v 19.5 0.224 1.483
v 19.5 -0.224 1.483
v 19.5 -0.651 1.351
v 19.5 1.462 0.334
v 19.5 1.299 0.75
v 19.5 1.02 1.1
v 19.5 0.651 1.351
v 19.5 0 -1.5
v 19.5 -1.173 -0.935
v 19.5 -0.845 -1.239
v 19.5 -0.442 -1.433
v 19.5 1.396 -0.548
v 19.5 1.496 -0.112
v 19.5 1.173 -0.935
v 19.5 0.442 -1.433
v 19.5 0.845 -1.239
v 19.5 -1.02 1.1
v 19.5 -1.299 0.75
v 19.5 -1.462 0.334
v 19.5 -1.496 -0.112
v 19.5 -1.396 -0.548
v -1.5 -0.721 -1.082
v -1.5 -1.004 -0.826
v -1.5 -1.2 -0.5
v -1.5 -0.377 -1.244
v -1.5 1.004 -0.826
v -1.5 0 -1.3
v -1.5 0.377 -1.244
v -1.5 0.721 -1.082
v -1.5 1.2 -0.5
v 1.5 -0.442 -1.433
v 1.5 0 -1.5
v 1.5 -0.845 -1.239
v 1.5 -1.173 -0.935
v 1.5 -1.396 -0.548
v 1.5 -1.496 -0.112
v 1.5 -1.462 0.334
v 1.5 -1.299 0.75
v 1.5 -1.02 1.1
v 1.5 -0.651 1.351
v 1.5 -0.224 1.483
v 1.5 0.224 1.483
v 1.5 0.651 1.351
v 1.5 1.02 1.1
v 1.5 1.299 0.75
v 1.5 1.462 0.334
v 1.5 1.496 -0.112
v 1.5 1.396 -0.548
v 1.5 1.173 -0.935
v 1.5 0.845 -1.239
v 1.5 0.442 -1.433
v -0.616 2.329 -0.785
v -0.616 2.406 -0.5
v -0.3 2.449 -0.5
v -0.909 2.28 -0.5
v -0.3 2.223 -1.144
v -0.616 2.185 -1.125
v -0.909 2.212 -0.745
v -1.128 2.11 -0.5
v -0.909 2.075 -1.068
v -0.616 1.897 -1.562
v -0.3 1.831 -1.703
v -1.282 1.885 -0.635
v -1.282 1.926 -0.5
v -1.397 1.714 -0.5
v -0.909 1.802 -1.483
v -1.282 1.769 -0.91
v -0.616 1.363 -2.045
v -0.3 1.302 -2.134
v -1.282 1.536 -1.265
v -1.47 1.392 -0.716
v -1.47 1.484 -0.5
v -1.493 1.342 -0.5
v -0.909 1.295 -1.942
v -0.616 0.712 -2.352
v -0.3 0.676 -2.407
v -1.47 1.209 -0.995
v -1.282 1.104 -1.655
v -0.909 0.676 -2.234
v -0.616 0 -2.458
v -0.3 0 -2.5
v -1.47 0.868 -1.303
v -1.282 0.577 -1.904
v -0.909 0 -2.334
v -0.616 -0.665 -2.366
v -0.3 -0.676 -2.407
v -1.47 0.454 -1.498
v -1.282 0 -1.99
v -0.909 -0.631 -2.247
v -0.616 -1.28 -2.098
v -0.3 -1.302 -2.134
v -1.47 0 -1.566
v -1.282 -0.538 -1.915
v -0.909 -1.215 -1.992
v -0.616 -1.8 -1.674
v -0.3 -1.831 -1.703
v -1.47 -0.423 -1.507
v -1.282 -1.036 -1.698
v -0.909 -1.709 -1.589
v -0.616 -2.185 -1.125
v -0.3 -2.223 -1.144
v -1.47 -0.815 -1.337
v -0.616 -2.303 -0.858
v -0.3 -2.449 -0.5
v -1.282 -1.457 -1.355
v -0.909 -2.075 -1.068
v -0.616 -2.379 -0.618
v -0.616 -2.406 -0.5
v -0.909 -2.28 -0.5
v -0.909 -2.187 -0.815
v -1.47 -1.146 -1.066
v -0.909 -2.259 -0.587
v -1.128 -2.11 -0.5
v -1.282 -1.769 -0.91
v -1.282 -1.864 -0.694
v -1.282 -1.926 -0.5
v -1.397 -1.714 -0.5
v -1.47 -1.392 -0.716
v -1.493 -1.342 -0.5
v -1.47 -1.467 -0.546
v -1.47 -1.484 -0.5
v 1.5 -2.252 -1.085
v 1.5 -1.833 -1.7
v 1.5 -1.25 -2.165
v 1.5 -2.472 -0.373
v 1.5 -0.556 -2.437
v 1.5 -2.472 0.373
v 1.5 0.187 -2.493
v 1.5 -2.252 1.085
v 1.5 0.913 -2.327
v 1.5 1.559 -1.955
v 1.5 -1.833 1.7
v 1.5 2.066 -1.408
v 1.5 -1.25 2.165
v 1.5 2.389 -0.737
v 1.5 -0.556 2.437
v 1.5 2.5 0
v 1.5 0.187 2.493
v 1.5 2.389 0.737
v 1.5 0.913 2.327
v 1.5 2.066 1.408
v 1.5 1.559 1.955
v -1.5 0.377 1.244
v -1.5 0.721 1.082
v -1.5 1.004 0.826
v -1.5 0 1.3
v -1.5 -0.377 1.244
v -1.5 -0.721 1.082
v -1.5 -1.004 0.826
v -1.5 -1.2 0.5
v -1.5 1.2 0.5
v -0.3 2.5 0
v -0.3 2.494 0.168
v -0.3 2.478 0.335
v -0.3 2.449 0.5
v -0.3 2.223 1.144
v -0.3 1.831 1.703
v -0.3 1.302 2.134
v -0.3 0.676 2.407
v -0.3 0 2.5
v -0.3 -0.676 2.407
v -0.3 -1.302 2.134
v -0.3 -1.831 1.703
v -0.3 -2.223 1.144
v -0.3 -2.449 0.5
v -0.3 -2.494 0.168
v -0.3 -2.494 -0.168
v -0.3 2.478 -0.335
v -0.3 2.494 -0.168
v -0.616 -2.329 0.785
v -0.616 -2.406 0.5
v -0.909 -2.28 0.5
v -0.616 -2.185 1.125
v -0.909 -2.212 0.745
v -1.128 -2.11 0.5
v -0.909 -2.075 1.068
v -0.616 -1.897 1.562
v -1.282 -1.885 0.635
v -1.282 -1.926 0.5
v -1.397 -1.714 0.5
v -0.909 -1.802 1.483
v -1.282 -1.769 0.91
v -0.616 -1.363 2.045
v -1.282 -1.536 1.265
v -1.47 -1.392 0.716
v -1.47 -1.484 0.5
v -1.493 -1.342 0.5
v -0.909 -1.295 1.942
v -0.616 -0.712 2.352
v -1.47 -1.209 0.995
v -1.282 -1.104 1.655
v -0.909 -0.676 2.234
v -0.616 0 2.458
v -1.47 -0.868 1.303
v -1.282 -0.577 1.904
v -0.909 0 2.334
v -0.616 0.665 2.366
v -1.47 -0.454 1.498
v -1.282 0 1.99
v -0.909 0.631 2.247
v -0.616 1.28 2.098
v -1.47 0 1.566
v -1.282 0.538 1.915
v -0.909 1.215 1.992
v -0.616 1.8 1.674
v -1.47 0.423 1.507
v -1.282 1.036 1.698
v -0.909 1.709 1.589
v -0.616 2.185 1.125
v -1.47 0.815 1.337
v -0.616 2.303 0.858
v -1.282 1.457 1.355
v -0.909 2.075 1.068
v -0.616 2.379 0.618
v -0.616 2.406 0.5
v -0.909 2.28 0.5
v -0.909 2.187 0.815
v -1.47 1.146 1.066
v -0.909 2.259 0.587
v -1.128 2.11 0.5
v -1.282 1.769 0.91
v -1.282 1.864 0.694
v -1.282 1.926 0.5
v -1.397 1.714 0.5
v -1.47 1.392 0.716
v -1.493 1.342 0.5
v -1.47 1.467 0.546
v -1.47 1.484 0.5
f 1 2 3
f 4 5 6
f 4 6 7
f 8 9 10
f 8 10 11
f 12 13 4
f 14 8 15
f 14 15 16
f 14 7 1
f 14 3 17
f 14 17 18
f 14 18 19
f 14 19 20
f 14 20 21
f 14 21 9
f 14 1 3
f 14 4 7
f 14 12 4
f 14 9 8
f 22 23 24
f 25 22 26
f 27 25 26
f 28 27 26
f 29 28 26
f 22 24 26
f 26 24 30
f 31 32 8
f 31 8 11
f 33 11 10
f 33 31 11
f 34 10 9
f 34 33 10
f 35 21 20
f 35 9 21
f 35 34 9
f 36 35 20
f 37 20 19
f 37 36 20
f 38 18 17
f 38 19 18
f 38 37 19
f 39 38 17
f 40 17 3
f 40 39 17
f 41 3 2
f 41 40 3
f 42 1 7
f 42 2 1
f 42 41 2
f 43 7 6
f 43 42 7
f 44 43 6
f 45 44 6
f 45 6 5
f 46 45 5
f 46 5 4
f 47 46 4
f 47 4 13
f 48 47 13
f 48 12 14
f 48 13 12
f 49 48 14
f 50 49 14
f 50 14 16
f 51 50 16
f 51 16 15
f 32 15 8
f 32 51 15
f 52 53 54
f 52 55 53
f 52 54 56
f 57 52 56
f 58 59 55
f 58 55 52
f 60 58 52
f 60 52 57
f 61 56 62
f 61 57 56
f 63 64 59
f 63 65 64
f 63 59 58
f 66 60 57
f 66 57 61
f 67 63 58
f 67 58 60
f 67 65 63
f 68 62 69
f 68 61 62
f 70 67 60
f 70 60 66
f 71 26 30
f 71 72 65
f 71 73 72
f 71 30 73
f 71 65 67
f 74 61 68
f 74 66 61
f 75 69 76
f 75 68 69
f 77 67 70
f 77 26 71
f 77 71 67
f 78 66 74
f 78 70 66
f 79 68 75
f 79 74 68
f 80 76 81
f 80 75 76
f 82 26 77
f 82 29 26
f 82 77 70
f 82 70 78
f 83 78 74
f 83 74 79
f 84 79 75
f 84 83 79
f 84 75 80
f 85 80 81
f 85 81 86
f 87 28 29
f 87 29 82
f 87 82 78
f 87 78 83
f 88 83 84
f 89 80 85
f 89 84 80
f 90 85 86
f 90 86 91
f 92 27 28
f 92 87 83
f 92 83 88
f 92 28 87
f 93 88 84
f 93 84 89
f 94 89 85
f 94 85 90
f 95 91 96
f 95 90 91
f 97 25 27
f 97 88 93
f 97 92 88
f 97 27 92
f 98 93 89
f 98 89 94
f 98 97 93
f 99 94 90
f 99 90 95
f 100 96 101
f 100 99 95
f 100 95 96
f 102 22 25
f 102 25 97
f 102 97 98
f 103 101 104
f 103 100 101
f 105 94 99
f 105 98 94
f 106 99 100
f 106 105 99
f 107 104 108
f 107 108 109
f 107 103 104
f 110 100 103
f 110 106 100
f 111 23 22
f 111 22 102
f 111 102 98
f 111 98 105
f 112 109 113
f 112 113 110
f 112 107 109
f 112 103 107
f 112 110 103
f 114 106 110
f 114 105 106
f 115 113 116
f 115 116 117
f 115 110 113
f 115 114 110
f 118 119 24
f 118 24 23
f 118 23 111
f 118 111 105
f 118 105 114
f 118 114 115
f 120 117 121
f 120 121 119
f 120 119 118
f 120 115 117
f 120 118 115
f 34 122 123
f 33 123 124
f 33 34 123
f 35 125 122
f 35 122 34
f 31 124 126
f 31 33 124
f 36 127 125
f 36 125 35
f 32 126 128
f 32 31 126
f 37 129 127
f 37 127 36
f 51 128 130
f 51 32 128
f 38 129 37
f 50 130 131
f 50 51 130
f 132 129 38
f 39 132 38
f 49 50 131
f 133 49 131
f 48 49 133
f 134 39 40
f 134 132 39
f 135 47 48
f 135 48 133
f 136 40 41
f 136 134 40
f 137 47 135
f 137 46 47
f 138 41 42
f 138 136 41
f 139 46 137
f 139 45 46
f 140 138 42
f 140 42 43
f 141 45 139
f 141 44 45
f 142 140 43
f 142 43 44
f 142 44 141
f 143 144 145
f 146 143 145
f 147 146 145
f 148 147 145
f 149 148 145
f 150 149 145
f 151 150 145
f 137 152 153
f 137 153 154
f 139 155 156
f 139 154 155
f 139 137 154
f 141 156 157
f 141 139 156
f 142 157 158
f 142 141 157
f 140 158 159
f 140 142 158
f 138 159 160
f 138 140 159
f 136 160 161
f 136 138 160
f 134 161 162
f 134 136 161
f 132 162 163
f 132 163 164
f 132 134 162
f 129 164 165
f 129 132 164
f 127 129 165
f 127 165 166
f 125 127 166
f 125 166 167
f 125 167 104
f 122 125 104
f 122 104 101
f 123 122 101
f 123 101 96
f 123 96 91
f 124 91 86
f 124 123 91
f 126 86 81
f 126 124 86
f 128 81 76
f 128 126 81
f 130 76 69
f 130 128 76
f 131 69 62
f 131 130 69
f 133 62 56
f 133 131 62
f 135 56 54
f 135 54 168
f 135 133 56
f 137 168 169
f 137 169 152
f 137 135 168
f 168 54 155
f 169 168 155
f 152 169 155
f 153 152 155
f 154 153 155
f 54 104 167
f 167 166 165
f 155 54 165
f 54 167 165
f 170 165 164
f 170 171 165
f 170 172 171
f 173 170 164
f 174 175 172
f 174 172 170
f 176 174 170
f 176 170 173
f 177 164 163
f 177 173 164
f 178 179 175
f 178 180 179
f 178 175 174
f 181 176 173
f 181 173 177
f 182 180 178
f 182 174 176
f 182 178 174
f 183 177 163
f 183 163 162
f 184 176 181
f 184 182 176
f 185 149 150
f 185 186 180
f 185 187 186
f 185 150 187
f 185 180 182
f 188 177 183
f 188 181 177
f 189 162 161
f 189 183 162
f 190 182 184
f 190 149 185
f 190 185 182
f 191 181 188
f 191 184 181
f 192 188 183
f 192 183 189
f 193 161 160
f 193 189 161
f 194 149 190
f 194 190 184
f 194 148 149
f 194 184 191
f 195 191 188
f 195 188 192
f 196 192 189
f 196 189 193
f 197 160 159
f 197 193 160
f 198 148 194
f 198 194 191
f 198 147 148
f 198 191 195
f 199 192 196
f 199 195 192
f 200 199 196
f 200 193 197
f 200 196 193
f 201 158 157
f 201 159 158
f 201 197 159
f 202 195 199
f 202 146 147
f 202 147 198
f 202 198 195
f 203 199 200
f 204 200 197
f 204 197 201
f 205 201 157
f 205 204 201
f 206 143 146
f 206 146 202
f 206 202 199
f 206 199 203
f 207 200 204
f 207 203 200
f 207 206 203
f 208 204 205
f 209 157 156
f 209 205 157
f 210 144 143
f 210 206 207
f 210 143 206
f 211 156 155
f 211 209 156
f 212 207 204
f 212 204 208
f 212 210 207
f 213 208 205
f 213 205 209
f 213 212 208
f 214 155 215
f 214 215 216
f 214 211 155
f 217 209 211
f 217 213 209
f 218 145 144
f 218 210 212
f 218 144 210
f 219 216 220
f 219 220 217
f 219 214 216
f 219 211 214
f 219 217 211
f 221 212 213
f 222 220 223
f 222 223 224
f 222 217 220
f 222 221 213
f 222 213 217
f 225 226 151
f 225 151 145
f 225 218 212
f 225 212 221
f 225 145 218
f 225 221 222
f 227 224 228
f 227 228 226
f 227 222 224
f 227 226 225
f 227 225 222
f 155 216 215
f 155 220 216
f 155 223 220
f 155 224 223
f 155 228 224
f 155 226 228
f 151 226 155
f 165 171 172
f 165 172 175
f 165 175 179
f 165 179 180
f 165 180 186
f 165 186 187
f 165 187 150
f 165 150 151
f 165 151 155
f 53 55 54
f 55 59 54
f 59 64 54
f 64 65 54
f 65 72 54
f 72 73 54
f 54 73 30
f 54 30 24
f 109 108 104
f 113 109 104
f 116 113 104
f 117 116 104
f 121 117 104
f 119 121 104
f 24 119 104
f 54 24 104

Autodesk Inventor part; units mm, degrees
ref_plane "YZ Plane" through (0, 0, 0) normal (1, 0, 0) x (0, 1, 0)
ref_plane "XZ Plane" through (0, 0, 0) normal (0, 1, 0) x (-1, 0, 0)
ref_plane "XY Plane" through (0, 0, 0) normal (0, 0, 1) x (1, 0, 0)
sketch "Sketch1" plane through (0, 0, 0) normal (1, 0, 0) x (0, 1, 0)
  circle A0 centre (0, 0) radius 2.5
extrude "Extrusion1" add sketch "Sketch1" along normal mid plane 3
sketch "Sketch2" plane through (1.5, 0, 0) normal (1, 0, 0) x (0, 0, -1)
  circle A0 centre (0, 0) radius 1.5
extrude "Extrusion2" add sketch "Sketch2" along normal blind 18
fillet "Fillet1" radius 1.2 1 edges at (-1.5, -2.5, 0)
sketch "Sketch3" plane through (0, 0, 0) normal (0, 1, 0) x (-1, 0, 0)
  line L0 (1.5, 1.3) -> (1.5, -1.3) projected
  line L1 (0.3, -2.5) -> (0.3, 2.5) projected
  line L2 (1.5, 0.5) -> (0.3, 0.5)
  line L3 (1.5, -0.5) -> (0.3, -0.5)
  line L4 (1.5, -0.5) -> (1.5, 0.5)
  line L5 (0.3, 0.5) -> (0.3, -0.5)
  point P0 (0, 0)
extrude "Extrusion3" cut sketch "Sketch3" along normal mid plane 18
thread "Thread1" size "M3x0.5" class "6g" standard "ANSI Metric M Profile" full length
thread "Thread2" size "M3x0.5" class "6g" standard "ANSI Metric M Profile" full length
properties part number "parafuso do captador( necessita de reparo)"
